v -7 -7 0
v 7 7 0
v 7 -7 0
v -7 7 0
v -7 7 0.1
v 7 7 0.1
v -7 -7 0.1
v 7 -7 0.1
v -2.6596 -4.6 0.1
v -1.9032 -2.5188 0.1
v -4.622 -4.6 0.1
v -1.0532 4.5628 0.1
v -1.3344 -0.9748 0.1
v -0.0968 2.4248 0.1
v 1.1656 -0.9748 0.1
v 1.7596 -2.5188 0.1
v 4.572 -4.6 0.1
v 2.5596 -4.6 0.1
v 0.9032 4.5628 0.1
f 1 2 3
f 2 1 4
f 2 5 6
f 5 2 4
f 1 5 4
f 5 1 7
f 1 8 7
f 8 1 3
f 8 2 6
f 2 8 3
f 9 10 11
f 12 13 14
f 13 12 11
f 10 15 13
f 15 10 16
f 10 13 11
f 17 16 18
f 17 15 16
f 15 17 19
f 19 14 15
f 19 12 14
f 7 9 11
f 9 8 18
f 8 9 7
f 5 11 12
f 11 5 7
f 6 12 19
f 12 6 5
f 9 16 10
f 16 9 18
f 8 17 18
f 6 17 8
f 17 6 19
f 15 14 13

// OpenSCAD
// file: ../p/box5-12.scad
use <../lib.scad>
function ldraw_lib__box5_12() = [
// 0 Box with 5 Faces without Any Edges
// 0 Name: box5-12.dat
// 0 Author: Chris Dee [cwdee]
// 0 !LDRAW_ORG Primitive UPDATE 2009-02
// 0 !LICENSE Licensed under CC BY 4.0 : see CAreadme.txt
// 
// 0 BFC CERTIFY CCW
  [0,"BFC","CERTIFY"],
  [0,"BFC","CCW"],
// 
// 0 !HISTORY 2009-09-03 [PTadmin] Official Update 2009-02
// 
// 
// 4 16 1 1 1 1 1 -1 -1 1 -1 -1 1 1
  [4,16,1,1,1,1,1,-1,-1,1,-1,-1,1,1],
// 4 16 -1 0 1 1 0 1 1 1 1 -1 1 1
  [4,16,-1,0,1,1,0,1,1,1,1,-1,1,1],
// 4 16 -1 0 -1 -1 0 1 -1 1 1 -1 1 -1
  [4,16,-1,0,-1,-1,0,1,-1,1,1,-1,1,-1],
// 4 16 1 0 -1 -1 0 -1 -1 1 -1 1 1 -1
  [4,16,1,0,-1,-1,0,-1,-1,1,-1,1,1,-1],
// 4 16 1 0 1 1 0 -1 1 1 -1 1 1 1
  [4,16,1,0,1,1,0,-1,1,1,-1,1,1,1],
// 0
];
module ldraw_lib__box5_12(step=0, col=false, unit=2/5, alt=false, line=0.2, solid=!$preview)
    makepoly(ldraw_lib__box5_12(), step=step, col=col, unit=unit, alt=alt, line=line, solid=solid);
ldraw_lib__box5_12(line=0.2);
// main file
use <../lib.scad>
use <../p/box5-12.scad>
function ldraw_lib__4521703t() = [
// 0 Sticker  1.7 x  1.7 with Dark_Red "A"
// 0 Name: 4521703t.dat
// 0 Author: J.C. Tchang [tchang]
// 0 !LDRAW_ORG Part UPDATE 2011-01
// 0 !LICENSE Licensed under CC BY 4.0 : see CAreadme.txt
// 
// 0 BFC CERTIFY CCW
  [0,"BFC","CERTIFY"],
  [0,"BFC","CCW"],
// 
// 0 !HISTORY 2011-07-25 [PTadmin] Official Update 2011-01
// 
// 
// 1 15 0 -0.25 0 17.5 0 0 0 0.25 0 0 0 17.5 box5-12.dat
  [1,15,0,-0.25,0,17.5,0,0,0,0.25,0,0,0,17.5, ldraw_lib__box5_12()],
// 0 //
// 3 320 -6.649 -0.25 -11.5 -4.758 -0.25 -6.297 -11.555 -0.25 -11.5
  [3,320,-6.649,-0.25,-11.5,-4.758,-0.25,-6.297,-11.555,-0.25,-11.5],
// 4 320 -2.633 -0.25 11.407 -11.555 -0.25 -11.5 -3.336 -0.25 -2.437 -0.242 -0.25 6.062
  [4,320,-2.633,-0.25,11.407,-11.555,-0.25,-11.5,-3.336,-0.25,-2.437,-0.242,-0.25,6.062],
// 4 320 2.914 -0.25 -2.437 -3.336 -0.25 -2.437 -4.758 -0.25 -6.297 4.399 -0.25 -6.297
  [4,320,2.914,-0.25,-2.437,-3.336,-0.25,-2.437,-4.758,-0.25,-6.297,4.399,-0.25,-6.297],
// 3 320 -4.758 -0.25 -6.297 -3.336 -0.25 -2.437 -11.555 -0.25 -11.5
  [3,320,-4.758,-0.25,-6.297,-3.336,-0.25,-2.437,-11.555,-0.25,-11.5],
// 3 320 11.43 -0.25 -11.5 4.399 -0.25 -6.297 6.399 -0.25 -11.5
  [3,320,11.43,-0.25,-11.5,4.399,-0.25,-6.297,6.399,-0.25,-11.5],
// 4 320 2.914 -0.25 -2.437 4.399 -0.25 -6.297 11.43 -0.25 -11.5 2.258 -0.25 11.407
  [4,320,2.914,-0.25,-2.437,4.399,-0.25,-6.297,11.43,-0.25,-11.5,2.258,-0.25,11.407],
// 3 320 2.258 -0.25 11.407 -0.242 -0.25 6.062 2.914 -0.25 -2.437
  [3,320,2.258,-0.25,11.407,-0.242,-0.25,6.062,2.914,-0.25,-2.437],
// 3 320 2.258 -0.25 11.407 -2.633 -0.25 11.407 -0.242 -0.25 6.062
  [3,320,2.258,-0.25,11.407,-2.633,-0.25,11.407,-0.242,-0.25,6.062],
// 0 //
// 3 15 -17.5 -0.25 -17.5 -6.649 -0.25 -11.5 -11.555 -0.25 -11.5
  [3,15,-17.5,-0.25,-17.5,-6.649,-0.25,-11.5,-11.555,-0.25,-11.5],
// 4 15 6.399 -0.25 -11.5 -6.649 -0.25 -11.5 -17.5 -0.25 -17.5 17.5 -0.25 -17.5
  [4,15,6.399,-0.25,-11.5,-6.649,-0.25,-11.5,-17.5,-0.25,-17.5,17.5,-0.25,-17.5],
// 4 15 -17.5 -0.25 17.5 -17.5 -0.25 -17.5 -11.555 -0.25 -11.5 -2.633 -0.25 11.407
  [4,15,-17.5,-0.25,17.5,-17.5,-0.25,-17.5,-11.555,-0.25,-11.5,-2.633,-0.25,11.407],
// 4 15 -17.5 -0.25 17.5 -2.633 -0.25 11.407 2.258 -0.25 11.407 17.5 -0.25 17.5
  [4,15,-17.5,-0.25,17.5,-2.633,-0.25,11.407,2.258,-0.25,11.407,17.5,-0.25,17.5],
// 4 15 4.399 -0.25 -6.297 -4.758 -0.25 -6.297 -6.649 -0.25 -11.5 6.399 -0.25 -11.5
  [4,15,4.399,-0.25,-6.297,-4.758,-0.25,-6.297,-6.649,-0.25,-11.5,6.399,-0.25,-11.5],
// 3 15 17.5 -0.25 -17.5 11.43 -0.25 -11.5 6.399 -0.25 -11.5
  [3,15,17.5,-0.25,-17.5,11.43,-0.25,-11.5,6.399,-0.25,-11.5],
// 4 15 11.43 -0.25 -11.5 17.5 -0.25 -17.5 17.5 -0.25 17.5 2.258 -0.25 11.407
  [4,15,11.43,-0.25,-11.5,17.5,-0.25,-17.5,17.5,-0.25,17.5,2.258,-0.25,11.407],
// 3 15 2.914 -0.25 -2.437 -0.242 -0.25 6.062 -3.336 -0.25 -2.437
  [3,15,2.914,-0.25,-2.437,-0.242,-0.25,6.062,-3.336,-0.25,-2.437],
// 0 //
];
module ldraw_lib__4521703t(step=0, col=false, unit=2/5, alt=false, line=0.2, solid=!$preview)
    makepoly(ldraw_lib__4521703t(), step=step, col=col, unit=unit, alt=alt, line=line, solid=solid);
ldraw_lib__4521703t(line=0.2);
